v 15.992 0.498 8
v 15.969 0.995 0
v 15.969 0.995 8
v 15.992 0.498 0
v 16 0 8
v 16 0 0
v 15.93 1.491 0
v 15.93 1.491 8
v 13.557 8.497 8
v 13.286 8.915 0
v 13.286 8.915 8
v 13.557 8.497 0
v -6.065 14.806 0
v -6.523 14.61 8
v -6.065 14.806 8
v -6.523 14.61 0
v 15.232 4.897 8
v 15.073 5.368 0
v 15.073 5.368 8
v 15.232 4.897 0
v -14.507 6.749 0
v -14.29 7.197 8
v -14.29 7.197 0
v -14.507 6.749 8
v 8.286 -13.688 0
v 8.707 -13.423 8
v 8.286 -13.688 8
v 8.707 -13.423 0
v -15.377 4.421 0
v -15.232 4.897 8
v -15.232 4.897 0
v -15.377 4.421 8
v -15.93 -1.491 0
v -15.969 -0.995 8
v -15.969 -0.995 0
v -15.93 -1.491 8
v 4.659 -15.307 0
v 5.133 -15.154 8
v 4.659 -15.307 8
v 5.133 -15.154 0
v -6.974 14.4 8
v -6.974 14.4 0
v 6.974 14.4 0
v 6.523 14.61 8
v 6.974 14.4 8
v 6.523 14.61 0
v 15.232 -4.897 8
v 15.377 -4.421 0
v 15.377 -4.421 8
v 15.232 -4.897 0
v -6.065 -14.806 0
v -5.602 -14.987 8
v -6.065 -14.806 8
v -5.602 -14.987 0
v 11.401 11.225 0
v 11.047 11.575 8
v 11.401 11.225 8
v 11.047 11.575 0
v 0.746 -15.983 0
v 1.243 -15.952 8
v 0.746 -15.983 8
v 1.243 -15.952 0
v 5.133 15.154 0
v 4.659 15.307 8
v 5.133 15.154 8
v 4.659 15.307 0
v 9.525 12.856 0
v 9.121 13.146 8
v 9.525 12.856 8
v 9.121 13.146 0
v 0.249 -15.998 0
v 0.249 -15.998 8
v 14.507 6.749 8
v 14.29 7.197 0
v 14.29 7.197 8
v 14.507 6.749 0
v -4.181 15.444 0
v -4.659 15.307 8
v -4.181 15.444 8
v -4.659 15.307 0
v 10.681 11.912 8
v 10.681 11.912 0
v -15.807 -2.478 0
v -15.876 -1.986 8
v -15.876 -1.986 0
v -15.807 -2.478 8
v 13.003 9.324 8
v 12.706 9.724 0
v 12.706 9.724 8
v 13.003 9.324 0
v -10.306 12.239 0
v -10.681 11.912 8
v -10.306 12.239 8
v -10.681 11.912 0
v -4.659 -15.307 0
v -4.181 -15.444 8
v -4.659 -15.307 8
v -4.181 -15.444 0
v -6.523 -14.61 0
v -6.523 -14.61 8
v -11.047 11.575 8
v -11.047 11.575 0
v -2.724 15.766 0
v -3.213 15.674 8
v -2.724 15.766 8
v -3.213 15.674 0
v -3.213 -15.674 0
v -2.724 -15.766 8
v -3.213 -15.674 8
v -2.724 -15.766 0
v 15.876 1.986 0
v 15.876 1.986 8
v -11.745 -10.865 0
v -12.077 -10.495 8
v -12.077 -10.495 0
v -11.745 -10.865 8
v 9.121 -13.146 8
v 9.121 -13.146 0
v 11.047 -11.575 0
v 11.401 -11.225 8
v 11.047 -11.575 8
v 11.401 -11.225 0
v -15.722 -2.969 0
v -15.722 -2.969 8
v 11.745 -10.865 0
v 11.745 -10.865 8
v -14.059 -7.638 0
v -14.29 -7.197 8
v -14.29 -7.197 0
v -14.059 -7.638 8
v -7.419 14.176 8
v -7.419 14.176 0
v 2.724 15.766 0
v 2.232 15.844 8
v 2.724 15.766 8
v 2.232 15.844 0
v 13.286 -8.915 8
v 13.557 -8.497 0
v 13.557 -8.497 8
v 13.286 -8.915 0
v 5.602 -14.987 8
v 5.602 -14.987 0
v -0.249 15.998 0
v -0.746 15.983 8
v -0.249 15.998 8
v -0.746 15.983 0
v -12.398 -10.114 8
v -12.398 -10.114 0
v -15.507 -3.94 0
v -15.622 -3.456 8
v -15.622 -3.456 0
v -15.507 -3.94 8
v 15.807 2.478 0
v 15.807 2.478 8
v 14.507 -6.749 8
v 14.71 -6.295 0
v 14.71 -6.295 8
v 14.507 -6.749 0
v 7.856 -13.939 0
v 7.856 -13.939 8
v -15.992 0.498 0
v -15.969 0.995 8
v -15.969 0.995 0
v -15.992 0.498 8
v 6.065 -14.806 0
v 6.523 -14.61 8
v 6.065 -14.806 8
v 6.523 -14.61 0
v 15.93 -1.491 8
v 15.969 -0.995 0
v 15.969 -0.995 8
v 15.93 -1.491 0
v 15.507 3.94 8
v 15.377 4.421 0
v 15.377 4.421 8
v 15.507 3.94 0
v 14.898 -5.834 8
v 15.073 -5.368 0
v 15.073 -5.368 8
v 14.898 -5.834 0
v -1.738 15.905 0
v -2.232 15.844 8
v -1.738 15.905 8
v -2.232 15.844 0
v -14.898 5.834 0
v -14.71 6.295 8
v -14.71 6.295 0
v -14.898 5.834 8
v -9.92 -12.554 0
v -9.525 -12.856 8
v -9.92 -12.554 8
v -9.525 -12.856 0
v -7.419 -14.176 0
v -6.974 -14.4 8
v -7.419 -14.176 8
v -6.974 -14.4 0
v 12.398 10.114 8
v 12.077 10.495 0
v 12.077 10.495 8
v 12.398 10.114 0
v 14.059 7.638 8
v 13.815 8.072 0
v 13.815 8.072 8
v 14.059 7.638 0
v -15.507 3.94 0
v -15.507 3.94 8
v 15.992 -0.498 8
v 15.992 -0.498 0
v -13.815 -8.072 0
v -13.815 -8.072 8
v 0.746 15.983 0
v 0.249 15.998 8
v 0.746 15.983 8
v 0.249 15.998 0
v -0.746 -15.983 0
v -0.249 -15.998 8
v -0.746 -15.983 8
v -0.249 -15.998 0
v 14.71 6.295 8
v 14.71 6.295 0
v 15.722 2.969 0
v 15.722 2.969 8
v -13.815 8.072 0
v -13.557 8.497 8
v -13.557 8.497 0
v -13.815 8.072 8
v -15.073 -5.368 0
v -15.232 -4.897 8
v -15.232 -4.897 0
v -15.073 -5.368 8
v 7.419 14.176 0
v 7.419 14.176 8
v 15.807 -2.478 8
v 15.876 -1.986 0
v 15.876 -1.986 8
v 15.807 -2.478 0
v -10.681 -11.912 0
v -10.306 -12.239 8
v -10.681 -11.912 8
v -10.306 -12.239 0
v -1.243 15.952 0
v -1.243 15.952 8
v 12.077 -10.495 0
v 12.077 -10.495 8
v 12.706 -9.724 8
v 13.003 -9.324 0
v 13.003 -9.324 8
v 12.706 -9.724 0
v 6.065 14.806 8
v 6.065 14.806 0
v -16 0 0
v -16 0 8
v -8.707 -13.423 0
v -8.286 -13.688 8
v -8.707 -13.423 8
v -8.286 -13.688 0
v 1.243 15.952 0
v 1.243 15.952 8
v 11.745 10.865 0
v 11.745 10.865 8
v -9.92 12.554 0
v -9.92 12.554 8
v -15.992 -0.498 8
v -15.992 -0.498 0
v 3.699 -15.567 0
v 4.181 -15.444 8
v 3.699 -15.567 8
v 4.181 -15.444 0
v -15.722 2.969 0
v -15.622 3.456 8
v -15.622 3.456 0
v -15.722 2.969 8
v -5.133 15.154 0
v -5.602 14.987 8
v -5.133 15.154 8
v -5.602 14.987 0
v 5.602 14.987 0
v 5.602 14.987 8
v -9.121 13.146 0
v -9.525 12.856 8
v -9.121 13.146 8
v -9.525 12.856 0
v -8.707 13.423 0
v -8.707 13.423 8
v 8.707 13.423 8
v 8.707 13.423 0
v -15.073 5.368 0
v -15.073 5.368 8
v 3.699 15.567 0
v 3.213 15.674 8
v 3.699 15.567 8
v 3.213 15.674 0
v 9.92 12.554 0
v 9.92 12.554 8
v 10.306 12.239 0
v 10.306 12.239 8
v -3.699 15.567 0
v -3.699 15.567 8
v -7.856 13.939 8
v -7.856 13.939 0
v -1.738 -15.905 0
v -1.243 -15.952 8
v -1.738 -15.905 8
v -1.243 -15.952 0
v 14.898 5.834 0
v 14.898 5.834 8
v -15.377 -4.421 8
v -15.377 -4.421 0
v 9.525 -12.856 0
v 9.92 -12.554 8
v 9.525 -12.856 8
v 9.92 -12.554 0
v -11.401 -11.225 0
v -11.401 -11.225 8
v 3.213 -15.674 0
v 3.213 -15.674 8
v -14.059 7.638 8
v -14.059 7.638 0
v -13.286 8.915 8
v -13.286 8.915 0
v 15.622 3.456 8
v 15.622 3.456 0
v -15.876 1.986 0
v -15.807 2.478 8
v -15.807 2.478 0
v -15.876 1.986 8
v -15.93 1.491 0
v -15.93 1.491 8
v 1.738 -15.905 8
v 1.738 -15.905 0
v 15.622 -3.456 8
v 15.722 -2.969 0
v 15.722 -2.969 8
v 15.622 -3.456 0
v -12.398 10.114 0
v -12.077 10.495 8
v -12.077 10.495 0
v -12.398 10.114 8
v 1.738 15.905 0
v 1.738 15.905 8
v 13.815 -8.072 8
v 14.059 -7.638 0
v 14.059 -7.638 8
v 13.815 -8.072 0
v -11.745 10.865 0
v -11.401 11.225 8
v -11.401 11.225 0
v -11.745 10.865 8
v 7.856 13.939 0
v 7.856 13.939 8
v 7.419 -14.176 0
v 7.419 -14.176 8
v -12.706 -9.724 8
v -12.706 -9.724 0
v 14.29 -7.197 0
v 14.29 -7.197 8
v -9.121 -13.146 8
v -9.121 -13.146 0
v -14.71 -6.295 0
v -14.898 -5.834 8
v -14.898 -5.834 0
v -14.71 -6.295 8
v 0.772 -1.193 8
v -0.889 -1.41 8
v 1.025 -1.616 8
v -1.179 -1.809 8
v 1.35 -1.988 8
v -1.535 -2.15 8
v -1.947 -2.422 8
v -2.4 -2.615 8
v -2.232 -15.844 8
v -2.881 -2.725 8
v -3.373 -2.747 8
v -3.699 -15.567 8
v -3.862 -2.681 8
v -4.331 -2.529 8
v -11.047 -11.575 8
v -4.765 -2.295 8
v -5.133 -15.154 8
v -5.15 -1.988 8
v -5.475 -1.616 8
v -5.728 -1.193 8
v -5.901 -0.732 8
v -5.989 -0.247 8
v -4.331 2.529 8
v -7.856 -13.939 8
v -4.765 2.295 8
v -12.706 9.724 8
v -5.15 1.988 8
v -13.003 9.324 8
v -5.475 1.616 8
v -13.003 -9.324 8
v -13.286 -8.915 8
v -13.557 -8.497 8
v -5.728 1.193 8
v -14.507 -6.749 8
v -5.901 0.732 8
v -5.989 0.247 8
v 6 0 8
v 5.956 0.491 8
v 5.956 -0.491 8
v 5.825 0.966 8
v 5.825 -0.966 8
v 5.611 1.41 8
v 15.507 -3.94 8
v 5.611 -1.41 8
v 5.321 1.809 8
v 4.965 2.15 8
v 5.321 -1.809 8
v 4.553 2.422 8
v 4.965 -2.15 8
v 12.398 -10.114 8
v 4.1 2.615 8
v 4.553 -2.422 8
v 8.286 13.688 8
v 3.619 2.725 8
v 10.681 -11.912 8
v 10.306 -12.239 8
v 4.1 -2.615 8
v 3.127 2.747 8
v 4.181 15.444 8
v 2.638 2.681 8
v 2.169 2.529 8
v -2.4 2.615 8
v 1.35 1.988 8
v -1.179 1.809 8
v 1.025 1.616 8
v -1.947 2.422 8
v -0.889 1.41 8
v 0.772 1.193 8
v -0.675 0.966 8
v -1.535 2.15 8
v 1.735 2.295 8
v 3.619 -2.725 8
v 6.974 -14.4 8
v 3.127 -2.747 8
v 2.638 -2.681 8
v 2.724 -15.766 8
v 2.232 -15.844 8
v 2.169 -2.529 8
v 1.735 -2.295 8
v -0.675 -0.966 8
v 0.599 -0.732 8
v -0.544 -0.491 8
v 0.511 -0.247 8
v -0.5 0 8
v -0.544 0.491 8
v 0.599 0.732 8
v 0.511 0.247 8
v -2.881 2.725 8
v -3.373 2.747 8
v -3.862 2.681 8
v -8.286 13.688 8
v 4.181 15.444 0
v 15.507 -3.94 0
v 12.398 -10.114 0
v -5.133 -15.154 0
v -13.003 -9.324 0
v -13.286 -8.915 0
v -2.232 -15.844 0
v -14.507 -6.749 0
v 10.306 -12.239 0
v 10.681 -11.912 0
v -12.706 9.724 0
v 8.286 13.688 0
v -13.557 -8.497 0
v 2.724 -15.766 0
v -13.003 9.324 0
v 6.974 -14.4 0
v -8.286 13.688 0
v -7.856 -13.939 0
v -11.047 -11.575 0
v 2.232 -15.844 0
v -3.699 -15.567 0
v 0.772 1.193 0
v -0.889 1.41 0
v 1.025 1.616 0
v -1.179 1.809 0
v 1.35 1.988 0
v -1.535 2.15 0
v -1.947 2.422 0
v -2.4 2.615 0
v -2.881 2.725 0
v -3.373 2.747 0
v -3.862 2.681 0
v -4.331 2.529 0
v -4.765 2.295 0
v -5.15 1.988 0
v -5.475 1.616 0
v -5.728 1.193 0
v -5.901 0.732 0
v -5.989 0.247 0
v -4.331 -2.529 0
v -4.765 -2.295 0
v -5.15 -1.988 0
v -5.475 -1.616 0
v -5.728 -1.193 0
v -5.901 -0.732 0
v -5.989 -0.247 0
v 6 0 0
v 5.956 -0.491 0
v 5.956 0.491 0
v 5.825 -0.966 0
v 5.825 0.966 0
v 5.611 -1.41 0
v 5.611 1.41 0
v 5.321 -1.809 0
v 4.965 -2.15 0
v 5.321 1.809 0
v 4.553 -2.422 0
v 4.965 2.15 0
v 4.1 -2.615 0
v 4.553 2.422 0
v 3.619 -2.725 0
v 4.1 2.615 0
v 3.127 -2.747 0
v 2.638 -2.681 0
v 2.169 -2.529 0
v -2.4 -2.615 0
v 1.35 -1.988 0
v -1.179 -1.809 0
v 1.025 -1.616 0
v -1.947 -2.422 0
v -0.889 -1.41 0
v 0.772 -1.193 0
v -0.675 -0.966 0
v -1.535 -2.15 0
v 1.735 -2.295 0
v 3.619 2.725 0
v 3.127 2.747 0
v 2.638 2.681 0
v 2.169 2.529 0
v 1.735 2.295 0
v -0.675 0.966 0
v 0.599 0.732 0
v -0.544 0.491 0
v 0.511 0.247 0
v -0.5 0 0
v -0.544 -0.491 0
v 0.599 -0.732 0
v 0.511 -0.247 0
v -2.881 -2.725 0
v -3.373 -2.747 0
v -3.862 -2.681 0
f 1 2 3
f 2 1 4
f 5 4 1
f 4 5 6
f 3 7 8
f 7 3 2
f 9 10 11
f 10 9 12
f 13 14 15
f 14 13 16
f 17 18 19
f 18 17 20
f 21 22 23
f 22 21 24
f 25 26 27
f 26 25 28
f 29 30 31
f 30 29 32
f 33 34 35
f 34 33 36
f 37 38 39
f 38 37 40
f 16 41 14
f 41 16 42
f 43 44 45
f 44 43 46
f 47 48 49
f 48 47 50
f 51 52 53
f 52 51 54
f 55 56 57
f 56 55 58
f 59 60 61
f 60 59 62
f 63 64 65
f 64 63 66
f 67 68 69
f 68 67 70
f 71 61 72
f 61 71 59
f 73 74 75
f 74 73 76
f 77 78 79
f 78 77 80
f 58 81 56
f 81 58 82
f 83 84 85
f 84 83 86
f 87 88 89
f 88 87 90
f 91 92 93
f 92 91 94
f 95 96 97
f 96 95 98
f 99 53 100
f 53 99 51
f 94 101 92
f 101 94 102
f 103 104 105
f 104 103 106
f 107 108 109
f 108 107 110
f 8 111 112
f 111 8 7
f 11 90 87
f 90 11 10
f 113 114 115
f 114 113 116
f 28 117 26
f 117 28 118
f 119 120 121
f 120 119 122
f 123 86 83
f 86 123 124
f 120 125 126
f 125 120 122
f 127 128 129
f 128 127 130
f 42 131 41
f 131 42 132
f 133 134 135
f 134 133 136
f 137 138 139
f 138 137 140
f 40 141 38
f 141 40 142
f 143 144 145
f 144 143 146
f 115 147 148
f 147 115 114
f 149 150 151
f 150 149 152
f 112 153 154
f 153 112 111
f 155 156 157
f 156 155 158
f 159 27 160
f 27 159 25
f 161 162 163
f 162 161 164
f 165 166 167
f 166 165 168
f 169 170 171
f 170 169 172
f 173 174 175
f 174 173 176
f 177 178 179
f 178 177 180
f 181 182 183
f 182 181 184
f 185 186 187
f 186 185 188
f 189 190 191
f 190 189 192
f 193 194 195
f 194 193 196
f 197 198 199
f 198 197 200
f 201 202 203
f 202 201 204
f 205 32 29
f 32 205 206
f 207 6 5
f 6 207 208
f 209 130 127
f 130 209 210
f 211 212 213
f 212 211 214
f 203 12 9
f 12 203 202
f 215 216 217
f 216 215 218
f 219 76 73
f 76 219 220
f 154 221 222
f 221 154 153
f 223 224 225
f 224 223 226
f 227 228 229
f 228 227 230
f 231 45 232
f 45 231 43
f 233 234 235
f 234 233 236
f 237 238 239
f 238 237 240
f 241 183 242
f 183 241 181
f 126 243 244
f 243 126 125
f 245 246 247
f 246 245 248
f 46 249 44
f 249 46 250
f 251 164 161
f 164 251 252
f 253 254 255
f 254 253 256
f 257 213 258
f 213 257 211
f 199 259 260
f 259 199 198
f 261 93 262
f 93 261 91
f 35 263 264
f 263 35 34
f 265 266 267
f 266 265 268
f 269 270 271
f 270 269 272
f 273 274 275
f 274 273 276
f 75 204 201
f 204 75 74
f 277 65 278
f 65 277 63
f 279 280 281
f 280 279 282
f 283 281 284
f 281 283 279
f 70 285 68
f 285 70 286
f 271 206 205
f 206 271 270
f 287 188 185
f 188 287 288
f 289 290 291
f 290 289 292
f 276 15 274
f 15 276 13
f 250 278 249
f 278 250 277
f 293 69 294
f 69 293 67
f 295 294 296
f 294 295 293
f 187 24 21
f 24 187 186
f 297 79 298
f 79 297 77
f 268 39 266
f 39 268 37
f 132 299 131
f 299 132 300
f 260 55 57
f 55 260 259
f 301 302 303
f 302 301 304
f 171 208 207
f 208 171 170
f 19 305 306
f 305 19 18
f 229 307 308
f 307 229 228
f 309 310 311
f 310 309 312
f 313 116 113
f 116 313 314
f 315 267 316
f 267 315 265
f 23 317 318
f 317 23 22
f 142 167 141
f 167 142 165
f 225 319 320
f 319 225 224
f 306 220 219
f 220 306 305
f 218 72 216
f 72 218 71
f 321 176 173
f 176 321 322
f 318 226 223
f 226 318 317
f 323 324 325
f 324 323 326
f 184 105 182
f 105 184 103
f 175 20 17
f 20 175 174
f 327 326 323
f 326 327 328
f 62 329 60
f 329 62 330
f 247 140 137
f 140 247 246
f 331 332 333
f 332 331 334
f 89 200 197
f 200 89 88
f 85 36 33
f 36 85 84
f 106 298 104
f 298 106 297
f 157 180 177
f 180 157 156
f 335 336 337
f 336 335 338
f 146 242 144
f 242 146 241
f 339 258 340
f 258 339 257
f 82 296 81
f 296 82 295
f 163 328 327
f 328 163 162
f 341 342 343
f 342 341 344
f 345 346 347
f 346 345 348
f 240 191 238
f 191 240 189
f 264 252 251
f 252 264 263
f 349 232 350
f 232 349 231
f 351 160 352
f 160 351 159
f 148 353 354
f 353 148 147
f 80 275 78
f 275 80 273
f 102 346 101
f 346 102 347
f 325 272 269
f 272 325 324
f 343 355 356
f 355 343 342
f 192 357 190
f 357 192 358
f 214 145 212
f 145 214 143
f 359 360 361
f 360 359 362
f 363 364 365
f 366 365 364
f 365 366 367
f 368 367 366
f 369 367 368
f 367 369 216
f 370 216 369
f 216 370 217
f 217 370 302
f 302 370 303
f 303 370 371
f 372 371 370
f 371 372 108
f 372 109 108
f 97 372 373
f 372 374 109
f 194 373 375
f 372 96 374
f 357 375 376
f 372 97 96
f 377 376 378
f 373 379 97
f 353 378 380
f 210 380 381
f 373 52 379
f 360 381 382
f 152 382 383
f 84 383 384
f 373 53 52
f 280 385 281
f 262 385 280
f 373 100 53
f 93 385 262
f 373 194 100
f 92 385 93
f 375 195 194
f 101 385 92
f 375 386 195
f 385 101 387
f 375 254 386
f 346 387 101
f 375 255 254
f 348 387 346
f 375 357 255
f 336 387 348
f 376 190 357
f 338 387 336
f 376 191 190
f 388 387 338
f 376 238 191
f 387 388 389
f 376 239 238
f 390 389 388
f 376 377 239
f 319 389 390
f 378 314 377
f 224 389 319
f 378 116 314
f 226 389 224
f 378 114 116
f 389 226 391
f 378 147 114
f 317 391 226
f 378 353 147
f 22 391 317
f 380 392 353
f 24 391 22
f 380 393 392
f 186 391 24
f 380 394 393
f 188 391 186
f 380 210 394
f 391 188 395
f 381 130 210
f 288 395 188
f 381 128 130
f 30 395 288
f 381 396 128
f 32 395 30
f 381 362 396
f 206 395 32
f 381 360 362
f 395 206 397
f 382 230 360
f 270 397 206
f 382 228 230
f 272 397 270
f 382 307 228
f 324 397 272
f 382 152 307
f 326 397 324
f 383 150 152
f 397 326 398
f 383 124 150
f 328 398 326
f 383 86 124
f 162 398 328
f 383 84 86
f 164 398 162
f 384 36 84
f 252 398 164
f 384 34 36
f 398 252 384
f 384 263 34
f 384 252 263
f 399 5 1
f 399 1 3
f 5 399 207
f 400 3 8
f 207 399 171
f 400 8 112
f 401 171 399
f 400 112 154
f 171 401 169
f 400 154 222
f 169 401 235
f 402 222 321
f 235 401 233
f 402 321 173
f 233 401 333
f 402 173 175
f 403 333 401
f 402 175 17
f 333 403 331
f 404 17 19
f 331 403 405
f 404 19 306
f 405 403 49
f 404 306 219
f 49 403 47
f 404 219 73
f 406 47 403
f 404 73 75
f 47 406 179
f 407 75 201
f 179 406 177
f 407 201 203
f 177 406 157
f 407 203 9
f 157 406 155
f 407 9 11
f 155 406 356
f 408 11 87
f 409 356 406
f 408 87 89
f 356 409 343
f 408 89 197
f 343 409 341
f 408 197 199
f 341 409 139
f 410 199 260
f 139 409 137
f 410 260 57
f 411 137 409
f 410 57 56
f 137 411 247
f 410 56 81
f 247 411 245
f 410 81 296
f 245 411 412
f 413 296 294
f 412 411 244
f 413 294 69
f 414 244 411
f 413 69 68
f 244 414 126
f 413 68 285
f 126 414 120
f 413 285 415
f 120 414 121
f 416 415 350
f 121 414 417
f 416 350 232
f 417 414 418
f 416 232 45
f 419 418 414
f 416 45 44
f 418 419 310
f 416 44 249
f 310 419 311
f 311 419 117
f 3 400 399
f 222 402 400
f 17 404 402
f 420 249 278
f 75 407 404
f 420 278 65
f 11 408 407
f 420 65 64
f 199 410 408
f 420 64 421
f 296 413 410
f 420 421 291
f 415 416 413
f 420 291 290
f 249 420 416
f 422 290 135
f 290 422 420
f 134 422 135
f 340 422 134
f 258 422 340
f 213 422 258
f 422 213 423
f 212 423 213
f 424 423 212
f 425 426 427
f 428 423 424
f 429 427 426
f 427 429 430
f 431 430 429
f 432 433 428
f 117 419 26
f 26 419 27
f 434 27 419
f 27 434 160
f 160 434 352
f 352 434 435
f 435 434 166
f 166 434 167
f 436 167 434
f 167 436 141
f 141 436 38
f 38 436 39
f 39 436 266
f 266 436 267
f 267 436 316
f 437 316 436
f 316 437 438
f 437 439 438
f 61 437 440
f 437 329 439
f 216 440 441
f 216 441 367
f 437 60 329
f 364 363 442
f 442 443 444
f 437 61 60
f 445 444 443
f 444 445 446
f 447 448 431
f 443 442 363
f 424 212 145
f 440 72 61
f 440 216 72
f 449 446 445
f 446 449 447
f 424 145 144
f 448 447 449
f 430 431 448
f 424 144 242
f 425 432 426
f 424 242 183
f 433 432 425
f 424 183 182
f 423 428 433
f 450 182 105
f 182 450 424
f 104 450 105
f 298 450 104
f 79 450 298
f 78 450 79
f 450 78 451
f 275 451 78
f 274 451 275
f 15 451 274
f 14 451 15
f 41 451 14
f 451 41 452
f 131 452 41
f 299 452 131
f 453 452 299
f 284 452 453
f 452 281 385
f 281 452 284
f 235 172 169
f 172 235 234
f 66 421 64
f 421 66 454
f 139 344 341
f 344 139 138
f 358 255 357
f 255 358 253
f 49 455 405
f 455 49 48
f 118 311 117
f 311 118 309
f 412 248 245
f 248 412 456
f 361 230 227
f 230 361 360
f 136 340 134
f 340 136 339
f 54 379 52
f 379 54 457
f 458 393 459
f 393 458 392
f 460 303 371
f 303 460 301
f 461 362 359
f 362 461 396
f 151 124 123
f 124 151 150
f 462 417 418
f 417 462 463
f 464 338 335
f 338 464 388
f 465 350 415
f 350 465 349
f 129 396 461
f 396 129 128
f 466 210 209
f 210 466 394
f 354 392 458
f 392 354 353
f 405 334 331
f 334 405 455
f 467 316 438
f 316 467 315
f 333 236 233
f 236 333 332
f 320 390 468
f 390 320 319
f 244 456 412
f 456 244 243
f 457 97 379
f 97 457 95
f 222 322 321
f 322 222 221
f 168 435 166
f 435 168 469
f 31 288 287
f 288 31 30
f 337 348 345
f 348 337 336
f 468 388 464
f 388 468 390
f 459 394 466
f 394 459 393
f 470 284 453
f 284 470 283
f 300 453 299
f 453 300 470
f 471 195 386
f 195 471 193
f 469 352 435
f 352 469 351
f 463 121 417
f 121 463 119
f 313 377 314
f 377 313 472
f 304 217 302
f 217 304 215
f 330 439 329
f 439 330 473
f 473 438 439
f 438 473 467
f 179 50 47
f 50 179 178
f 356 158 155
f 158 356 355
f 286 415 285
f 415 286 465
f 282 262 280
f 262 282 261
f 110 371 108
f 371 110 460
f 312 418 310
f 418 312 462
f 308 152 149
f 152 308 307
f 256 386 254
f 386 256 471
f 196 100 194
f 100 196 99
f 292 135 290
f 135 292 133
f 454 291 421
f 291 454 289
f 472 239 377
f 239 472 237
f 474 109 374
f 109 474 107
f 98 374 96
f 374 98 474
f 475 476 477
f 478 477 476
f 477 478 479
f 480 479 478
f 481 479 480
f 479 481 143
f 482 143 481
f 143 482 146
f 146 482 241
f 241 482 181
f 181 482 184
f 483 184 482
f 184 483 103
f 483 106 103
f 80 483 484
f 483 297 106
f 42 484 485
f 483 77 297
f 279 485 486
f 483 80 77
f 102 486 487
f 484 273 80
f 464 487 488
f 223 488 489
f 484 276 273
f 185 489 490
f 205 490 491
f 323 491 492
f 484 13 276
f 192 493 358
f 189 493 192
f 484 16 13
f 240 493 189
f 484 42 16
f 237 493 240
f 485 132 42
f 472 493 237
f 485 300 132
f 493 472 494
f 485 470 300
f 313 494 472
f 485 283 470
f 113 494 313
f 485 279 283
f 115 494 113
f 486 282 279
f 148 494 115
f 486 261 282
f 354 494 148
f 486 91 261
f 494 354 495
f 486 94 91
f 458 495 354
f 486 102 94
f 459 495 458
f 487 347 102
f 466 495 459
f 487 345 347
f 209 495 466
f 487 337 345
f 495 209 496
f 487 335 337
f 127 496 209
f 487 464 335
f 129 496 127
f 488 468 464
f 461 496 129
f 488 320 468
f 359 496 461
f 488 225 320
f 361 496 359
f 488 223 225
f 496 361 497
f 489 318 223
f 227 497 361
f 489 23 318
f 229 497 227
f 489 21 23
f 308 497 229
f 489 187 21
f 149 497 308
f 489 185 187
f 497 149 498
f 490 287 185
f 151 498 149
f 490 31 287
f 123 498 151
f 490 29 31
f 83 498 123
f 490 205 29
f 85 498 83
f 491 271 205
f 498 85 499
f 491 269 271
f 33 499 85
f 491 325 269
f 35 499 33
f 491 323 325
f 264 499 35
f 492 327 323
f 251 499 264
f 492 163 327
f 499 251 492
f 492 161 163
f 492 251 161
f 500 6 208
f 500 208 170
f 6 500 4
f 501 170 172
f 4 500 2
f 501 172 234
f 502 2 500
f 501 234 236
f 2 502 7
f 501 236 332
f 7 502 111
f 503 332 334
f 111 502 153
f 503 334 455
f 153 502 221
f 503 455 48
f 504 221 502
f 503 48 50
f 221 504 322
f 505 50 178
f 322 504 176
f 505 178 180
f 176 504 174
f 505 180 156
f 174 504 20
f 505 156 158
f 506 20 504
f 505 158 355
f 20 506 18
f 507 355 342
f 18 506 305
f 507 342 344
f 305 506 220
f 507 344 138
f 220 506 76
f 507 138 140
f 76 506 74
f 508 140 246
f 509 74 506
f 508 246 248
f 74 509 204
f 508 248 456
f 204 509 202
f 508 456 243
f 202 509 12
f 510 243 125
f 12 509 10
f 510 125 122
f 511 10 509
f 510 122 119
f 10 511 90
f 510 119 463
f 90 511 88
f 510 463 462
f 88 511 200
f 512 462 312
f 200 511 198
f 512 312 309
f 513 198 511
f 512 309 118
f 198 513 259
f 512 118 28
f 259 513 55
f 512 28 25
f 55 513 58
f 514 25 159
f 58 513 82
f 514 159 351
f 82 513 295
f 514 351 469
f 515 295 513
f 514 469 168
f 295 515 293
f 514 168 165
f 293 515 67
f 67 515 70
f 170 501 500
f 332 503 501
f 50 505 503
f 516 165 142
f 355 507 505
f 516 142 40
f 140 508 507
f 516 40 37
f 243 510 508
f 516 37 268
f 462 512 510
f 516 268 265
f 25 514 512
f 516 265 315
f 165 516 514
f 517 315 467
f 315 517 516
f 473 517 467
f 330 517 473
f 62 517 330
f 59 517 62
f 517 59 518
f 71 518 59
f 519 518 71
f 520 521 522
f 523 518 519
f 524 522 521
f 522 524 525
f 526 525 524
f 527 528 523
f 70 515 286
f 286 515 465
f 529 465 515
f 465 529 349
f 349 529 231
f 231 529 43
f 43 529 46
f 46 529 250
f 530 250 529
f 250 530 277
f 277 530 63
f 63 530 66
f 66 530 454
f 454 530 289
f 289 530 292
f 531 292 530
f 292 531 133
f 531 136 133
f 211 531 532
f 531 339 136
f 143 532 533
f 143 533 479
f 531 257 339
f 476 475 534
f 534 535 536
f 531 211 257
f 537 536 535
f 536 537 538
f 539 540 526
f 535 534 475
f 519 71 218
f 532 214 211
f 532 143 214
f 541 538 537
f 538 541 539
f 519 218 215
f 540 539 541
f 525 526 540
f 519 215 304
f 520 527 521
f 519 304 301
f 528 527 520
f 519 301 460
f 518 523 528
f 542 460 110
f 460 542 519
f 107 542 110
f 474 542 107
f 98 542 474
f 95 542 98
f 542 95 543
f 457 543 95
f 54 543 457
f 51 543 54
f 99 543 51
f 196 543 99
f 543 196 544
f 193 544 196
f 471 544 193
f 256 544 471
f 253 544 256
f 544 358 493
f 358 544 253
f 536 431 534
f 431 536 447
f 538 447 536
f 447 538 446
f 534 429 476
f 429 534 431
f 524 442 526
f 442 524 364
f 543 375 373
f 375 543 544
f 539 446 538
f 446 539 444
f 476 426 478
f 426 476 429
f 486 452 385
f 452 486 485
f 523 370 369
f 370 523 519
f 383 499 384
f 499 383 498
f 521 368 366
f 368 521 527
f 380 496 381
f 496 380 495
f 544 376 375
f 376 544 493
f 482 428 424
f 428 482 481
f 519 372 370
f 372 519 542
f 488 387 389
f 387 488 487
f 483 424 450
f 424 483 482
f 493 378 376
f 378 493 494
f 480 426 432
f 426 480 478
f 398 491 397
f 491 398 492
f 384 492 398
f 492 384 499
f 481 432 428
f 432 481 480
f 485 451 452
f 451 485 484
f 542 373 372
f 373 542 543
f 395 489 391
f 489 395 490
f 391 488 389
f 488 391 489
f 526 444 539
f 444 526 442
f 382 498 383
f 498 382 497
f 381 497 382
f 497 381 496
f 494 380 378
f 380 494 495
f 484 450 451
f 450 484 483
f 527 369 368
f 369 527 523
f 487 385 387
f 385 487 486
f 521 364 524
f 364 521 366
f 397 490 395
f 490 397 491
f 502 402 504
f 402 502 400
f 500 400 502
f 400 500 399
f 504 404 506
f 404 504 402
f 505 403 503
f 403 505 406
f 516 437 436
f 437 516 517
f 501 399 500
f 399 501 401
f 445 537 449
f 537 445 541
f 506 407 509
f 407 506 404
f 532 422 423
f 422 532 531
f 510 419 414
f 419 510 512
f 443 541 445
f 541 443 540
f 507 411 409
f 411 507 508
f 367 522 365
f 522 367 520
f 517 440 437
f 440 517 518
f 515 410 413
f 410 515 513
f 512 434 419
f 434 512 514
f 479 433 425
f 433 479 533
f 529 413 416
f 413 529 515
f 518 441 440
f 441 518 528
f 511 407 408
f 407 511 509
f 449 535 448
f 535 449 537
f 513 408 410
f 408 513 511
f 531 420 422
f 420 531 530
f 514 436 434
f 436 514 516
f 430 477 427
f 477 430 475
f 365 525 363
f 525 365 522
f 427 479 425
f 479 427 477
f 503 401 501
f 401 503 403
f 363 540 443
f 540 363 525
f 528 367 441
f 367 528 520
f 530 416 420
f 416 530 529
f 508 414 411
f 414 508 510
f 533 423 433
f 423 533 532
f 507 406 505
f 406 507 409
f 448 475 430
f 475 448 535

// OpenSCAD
$fa = 1;
$fs = 0.5;

part = "LED holder"; // [LED holder, Cover, Assembly, Assembly cutaway]

/* [LED holder] */
led_diameter_1 = 5.5;
led_diameter_2 = 5.5;
led_holder_height = 8;

// Shouldn't need to be modified
led_spacing = 6.5;
// Shouldn't need to be modified
led_holder_diameter = 32;

/* [Cover] */
cover_wall_thickness = 1;
cover_clearance = 0.3;
cover_height = 14;
// How much of the LED holder goes into the cover
cover_led_holder_depth = 5;
cover_raised_ring_width = 2;
cover_cable_hole_diameter = 4;

module led_holder()
{
	difference() {
		cylinder(d=led_holder_diameter, h=led_holder_height);

		translate([-led_spacing/2, 0, -0.1]) //-0.1 on Z to make the preview look correct
			cylinder(d=led_diameter_1, h=led_holder_height + 0.2);
		translate([led_spacing/2, 0, -0.1])
			cylinder(d=led_diameter_2, h=led_holder_height + 0.2);
	}
}

module cover()
{
	inner_diameter = led_holder_diameter + cover_clearance;
	difference() {
		union() {
			difference() {
				cylinder(d=inner_diameter + cover_wall_thickness * 2, h=cover_height + cover_wall_thickness);

				translate([0, 0, cover_wall_thickness])
					cylinder(d=inner_diameter, h=cover_height + 0.1);
			}

			// The raised ring that stops the LED holder from going in too far
			h = cover_height - cover_led_holder_depth;
			translate([0, 0, cover_wall_thickness])
				difference() {
					cylinder(d=inner_diameter, h=h);

					cylinder(d=inner_diameter - cover_raised_ring_width * 2, h=h + 0.1);
				}
		}

		translate([0, 0, cover_wall_thickness + cover_cable_hole_diameter / 2]) rotate([90, 0, 0])
			cylinder(d=cover_cable_hole_diameter, h=inner_diameter);
	}
}

module assembly()
{
	led_holder();

	translate([0, 0, cover_height + cover_led_holder_depth - cover_wall_thickness]) rotate([0, 180, 0])
		cover();
}

if(part == "LED holder")
	led_holder();
else if(part == "Cover")
	cover();
else if(part == "Assembly")
	assembly();
else if(part == "Assembly cutaway") {
	difference() {
		assembly();

		translate([-led_holder_diameter, 0, -1])
			cube([led_holder_diameter * 2, led_holder_diameter * 2, cover_height + led_holder_height]);
	}
}
